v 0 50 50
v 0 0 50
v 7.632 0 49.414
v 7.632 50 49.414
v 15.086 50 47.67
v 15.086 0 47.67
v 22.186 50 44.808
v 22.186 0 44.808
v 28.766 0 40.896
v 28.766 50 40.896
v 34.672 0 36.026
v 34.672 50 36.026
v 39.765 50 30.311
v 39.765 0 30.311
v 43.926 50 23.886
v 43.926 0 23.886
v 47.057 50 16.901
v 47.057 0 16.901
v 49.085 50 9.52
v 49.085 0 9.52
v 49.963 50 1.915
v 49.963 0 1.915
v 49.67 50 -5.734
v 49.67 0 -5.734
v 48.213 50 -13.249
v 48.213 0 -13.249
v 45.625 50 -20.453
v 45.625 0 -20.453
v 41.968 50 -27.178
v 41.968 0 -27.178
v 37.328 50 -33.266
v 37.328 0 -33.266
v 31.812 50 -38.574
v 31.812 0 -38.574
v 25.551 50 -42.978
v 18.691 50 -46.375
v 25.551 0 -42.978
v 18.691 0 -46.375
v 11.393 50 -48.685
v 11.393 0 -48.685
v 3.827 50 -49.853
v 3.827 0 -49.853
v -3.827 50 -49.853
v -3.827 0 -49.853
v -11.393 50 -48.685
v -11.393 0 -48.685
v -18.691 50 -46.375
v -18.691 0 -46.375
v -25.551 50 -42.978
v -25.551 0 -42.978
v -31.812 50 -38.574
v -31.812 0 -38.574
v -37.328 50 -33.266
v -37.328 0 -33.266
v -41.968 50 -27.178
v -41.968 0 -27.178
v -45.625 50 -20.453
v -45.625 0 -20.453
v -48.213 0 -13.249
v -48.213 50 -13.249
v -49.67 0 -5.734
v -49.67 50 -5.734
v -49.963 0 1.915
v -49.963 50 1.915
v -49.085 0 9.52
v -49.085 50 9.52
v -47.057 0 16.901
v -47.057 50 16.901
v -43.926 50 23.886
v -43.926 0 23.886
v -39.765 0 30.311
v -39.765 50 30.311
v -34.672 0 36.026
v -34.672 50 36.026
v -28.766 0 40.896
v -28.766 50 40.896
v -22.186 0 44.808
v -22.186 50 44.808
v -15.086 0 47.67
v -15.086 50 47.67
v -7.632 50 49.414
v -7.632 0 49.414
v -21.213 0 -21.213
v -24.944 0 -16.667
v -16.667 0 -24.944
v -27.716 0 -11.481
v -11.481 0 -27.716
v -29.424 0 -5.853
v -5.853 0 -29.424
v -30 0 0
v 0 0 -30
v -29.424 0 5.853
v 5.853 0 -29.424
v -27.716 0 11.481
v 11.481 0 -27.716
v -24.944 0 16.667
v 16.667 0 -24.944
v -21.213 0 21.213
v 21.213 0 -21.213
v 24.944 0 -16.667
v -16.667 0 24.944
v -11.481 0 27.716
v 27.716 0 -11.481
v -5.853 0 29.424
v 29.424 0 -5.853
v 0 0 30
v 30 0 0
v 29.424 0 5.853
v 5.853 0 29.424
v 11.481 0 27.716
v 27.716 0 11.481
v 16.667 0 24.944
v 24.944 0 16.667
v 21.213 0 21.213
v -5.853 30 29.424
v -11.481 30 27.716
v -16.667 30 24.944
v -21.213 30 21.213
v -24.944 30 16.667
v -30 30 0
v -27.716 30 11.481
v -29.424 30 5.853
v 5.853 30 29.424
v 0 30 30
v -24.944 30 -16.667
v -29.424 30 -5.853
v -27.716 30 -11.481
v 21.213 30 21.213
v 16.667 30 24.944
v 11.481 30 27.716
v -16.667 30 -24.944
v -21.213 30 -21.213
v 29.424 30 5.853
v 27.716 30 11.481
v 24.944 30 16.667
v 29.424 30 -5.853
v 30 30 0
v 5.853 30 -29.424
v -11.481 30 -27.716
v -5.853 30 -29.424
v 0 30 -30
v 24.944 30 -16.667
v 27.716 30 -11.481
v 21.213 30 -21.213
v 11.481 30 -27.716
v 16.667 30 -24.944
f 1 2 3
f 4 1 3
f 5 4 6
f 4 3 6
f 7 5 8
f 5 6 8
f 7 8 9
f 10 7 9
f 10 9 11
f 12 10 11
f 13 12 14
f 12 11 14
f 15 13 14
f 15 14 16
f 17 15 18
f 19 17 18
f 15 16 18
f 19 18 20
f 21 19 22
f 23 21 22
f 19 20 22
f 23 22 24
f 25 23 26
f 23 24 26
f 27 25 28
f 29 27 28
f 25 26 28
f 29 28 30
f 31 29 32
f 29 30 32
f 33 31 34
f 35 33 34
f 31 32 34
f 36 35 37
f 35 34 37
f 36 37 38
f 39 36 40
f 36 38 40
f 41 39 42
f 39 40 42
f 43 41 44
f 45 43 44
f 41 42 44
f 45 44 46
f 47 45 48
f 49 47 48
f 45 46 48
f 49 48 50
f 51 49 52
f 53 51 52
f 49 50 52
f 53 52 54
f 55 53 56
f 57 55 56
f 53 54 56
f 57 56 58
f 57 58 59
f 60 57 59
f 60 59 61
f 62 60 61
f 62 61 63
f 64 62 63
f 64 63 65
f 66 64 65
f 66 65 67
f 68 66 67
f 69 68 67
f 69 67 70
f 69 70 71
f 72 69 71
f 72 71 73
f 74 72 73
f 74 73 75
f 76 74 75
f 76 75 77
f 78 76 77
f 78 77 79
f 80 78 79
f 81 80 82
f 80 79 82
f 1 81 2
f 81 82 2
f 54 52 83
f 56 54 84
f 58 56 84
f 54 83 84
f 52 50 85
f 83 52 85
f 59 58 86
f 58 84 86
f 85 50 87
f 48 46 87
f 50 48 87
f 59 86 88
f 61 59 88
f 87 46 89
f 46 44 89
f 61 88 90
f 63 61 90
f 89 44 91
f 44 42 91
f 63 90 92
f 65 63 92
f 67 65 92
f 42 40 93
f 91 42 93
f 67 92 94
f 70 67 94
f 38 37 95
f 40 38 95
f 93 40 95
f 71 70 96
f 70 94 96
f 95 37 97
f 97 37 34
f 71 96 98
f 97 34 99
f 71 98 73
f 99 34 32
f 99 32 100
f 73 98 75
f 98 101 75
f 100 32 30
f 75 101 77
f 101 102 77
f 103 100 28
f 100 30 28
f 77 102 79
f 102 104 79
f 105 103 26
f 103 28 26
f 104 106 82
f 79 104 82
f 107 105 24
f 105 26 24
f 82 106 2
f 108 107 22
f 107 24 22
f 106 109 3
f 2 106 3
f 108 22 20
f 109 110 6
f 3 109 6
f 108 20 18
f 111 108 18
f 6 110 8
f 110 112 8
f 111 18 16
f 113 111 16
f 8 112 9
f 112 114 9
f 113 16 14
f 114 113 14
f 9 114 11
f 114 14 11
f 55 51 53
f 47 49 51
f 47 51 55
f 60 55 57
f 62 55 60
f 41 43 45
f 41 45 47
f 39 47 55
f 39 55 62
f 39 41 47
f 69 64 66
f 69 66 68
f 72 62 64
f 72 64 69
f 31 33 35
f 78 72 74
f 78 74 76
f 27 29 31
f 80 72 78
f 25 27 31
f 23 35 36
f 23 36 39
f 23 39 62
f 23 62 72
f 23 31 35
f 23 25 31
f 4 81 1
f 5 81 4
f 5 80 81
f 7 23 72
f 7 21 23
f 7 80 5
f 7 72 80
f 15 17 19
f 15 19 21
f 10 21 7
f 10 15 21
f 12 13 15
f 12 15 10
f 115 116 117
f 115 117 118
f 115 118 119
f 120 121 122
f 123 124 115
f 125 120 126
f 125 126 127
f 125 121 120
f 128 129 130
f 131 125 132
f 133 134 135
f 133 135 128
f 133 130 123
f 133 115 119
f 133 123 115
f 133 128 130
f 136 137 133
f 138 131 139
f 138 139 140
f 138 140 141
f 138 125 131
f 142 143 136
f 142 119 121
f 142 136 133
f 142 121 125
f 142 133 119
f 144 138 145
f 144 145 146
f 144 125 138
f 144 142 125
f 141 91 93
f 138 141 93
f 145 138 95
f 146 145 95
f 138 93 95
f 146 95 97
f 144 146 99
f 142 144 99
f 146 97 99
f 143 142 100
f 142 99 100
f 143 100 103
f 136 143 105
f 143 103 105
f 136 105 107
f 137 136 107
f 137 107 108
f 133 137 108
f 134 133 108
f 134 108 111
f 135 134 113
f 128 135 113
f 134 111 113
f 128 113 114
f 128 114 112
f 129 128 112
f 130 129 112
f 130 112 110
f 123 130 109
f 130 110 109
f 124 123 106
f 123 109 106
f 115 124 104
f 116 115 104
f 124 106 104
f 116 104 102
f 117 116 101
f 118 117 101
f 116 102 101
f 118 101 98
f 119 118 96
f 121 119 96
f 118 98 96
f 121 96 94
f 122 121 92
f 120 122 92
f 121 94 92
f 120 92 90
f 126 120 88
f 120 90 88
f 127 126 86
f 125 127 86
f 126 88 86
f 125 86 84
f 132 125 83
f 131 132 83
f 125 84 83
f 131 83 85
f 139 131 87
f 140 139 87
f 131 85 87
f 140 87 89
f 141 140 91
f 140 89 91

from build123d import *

# Parameters (mm, degrees)
SKETCH1_W           = 50
SKETCH1_H           = 25
BOSS_EXTRUDE1_DEPTH = 25
FILLET2_R           = 5
CUT_EXTRUDE1_DEPTH  = 15
SKETCH3_R           = 50
BOSS_EXTRUDE2_DEPTH = 50
SKETCH4_R           = 30
CUT_EXTRUDE2_DEPTH  = 30


with BuildPart() as part:
    # Sketch1 → Boss-Extrude1 (new body)
    with BuildSketch(Plane(origin=(0, 0, 0), x_dir=(1, 0, 0), z_dir=(0, 1, 0))):
        Rectangle(SKETCH1_W, SKETCH1_H)
    extrude(amount=BOSS_EXTRUDE1_DEPTH)

    # Fillet2
    fillet2_edges = [part.edges().sort_by_distance(p)[0] for p in [
        (25, 12.5, 12.5),
        (-25, 12.5, 12.5),
        (-25, 12.5, -12.5),
        (25, 12.5, -12.5),
    ]]
    fillet(fillet2_edges, radius=FILLET2_R)

    # Sketch2 → Cut-Extrude1 (cut)
    with BuildSketch(Plane(origin=(0, 25, 0), x_dir=(1, 0, 0), z_dir=(0, 1, 0))):
        with BuildLine():
            Line((-13.058351702, 9.034247402), (13.06, 9.034247402))
            ThreePointArc((13.06, 9.034247402), (22.094247402, 0), (13.06, -9.034247402))
            Line((13.06, -9.034247402), (-13.058351702, -9.034247402))
            ThreePointArc((-13.058351702, -9.034247402), (-22.092599103, 0), (-13.058351702, 9.034247402))
        make_face()
    extrude(amount=-CUT_EXTRUDE1_DEPTH, mode=Mode.SUBTRACT)

    # Sketch3 → Boss-Extrude2 (add)
    with BuildSketch(Plane(origin=(0, 0, 0), x_dir=(1, 0, 0), z_dir=(0, 1, 0))):
        with Locations(Location((0, 0, 0), (0, 0, 270))):
            Circle(SKETCH3_R)
    extrude(amount=BOSS_EXTRUDE2_DEPTH)

    # Sketch4 → Cut-Extrude2 (cut)
    with BuildSketch(Plane.XZ):
        with Locations(Location((0, 0, 0), (0, 0, 270))):
            Circle(SKETCH4_R)
    extrude(amount=-CUT_EXTRUDE2_DEPTH, mode=Mode.SUBTRACT)


solid = part.part
